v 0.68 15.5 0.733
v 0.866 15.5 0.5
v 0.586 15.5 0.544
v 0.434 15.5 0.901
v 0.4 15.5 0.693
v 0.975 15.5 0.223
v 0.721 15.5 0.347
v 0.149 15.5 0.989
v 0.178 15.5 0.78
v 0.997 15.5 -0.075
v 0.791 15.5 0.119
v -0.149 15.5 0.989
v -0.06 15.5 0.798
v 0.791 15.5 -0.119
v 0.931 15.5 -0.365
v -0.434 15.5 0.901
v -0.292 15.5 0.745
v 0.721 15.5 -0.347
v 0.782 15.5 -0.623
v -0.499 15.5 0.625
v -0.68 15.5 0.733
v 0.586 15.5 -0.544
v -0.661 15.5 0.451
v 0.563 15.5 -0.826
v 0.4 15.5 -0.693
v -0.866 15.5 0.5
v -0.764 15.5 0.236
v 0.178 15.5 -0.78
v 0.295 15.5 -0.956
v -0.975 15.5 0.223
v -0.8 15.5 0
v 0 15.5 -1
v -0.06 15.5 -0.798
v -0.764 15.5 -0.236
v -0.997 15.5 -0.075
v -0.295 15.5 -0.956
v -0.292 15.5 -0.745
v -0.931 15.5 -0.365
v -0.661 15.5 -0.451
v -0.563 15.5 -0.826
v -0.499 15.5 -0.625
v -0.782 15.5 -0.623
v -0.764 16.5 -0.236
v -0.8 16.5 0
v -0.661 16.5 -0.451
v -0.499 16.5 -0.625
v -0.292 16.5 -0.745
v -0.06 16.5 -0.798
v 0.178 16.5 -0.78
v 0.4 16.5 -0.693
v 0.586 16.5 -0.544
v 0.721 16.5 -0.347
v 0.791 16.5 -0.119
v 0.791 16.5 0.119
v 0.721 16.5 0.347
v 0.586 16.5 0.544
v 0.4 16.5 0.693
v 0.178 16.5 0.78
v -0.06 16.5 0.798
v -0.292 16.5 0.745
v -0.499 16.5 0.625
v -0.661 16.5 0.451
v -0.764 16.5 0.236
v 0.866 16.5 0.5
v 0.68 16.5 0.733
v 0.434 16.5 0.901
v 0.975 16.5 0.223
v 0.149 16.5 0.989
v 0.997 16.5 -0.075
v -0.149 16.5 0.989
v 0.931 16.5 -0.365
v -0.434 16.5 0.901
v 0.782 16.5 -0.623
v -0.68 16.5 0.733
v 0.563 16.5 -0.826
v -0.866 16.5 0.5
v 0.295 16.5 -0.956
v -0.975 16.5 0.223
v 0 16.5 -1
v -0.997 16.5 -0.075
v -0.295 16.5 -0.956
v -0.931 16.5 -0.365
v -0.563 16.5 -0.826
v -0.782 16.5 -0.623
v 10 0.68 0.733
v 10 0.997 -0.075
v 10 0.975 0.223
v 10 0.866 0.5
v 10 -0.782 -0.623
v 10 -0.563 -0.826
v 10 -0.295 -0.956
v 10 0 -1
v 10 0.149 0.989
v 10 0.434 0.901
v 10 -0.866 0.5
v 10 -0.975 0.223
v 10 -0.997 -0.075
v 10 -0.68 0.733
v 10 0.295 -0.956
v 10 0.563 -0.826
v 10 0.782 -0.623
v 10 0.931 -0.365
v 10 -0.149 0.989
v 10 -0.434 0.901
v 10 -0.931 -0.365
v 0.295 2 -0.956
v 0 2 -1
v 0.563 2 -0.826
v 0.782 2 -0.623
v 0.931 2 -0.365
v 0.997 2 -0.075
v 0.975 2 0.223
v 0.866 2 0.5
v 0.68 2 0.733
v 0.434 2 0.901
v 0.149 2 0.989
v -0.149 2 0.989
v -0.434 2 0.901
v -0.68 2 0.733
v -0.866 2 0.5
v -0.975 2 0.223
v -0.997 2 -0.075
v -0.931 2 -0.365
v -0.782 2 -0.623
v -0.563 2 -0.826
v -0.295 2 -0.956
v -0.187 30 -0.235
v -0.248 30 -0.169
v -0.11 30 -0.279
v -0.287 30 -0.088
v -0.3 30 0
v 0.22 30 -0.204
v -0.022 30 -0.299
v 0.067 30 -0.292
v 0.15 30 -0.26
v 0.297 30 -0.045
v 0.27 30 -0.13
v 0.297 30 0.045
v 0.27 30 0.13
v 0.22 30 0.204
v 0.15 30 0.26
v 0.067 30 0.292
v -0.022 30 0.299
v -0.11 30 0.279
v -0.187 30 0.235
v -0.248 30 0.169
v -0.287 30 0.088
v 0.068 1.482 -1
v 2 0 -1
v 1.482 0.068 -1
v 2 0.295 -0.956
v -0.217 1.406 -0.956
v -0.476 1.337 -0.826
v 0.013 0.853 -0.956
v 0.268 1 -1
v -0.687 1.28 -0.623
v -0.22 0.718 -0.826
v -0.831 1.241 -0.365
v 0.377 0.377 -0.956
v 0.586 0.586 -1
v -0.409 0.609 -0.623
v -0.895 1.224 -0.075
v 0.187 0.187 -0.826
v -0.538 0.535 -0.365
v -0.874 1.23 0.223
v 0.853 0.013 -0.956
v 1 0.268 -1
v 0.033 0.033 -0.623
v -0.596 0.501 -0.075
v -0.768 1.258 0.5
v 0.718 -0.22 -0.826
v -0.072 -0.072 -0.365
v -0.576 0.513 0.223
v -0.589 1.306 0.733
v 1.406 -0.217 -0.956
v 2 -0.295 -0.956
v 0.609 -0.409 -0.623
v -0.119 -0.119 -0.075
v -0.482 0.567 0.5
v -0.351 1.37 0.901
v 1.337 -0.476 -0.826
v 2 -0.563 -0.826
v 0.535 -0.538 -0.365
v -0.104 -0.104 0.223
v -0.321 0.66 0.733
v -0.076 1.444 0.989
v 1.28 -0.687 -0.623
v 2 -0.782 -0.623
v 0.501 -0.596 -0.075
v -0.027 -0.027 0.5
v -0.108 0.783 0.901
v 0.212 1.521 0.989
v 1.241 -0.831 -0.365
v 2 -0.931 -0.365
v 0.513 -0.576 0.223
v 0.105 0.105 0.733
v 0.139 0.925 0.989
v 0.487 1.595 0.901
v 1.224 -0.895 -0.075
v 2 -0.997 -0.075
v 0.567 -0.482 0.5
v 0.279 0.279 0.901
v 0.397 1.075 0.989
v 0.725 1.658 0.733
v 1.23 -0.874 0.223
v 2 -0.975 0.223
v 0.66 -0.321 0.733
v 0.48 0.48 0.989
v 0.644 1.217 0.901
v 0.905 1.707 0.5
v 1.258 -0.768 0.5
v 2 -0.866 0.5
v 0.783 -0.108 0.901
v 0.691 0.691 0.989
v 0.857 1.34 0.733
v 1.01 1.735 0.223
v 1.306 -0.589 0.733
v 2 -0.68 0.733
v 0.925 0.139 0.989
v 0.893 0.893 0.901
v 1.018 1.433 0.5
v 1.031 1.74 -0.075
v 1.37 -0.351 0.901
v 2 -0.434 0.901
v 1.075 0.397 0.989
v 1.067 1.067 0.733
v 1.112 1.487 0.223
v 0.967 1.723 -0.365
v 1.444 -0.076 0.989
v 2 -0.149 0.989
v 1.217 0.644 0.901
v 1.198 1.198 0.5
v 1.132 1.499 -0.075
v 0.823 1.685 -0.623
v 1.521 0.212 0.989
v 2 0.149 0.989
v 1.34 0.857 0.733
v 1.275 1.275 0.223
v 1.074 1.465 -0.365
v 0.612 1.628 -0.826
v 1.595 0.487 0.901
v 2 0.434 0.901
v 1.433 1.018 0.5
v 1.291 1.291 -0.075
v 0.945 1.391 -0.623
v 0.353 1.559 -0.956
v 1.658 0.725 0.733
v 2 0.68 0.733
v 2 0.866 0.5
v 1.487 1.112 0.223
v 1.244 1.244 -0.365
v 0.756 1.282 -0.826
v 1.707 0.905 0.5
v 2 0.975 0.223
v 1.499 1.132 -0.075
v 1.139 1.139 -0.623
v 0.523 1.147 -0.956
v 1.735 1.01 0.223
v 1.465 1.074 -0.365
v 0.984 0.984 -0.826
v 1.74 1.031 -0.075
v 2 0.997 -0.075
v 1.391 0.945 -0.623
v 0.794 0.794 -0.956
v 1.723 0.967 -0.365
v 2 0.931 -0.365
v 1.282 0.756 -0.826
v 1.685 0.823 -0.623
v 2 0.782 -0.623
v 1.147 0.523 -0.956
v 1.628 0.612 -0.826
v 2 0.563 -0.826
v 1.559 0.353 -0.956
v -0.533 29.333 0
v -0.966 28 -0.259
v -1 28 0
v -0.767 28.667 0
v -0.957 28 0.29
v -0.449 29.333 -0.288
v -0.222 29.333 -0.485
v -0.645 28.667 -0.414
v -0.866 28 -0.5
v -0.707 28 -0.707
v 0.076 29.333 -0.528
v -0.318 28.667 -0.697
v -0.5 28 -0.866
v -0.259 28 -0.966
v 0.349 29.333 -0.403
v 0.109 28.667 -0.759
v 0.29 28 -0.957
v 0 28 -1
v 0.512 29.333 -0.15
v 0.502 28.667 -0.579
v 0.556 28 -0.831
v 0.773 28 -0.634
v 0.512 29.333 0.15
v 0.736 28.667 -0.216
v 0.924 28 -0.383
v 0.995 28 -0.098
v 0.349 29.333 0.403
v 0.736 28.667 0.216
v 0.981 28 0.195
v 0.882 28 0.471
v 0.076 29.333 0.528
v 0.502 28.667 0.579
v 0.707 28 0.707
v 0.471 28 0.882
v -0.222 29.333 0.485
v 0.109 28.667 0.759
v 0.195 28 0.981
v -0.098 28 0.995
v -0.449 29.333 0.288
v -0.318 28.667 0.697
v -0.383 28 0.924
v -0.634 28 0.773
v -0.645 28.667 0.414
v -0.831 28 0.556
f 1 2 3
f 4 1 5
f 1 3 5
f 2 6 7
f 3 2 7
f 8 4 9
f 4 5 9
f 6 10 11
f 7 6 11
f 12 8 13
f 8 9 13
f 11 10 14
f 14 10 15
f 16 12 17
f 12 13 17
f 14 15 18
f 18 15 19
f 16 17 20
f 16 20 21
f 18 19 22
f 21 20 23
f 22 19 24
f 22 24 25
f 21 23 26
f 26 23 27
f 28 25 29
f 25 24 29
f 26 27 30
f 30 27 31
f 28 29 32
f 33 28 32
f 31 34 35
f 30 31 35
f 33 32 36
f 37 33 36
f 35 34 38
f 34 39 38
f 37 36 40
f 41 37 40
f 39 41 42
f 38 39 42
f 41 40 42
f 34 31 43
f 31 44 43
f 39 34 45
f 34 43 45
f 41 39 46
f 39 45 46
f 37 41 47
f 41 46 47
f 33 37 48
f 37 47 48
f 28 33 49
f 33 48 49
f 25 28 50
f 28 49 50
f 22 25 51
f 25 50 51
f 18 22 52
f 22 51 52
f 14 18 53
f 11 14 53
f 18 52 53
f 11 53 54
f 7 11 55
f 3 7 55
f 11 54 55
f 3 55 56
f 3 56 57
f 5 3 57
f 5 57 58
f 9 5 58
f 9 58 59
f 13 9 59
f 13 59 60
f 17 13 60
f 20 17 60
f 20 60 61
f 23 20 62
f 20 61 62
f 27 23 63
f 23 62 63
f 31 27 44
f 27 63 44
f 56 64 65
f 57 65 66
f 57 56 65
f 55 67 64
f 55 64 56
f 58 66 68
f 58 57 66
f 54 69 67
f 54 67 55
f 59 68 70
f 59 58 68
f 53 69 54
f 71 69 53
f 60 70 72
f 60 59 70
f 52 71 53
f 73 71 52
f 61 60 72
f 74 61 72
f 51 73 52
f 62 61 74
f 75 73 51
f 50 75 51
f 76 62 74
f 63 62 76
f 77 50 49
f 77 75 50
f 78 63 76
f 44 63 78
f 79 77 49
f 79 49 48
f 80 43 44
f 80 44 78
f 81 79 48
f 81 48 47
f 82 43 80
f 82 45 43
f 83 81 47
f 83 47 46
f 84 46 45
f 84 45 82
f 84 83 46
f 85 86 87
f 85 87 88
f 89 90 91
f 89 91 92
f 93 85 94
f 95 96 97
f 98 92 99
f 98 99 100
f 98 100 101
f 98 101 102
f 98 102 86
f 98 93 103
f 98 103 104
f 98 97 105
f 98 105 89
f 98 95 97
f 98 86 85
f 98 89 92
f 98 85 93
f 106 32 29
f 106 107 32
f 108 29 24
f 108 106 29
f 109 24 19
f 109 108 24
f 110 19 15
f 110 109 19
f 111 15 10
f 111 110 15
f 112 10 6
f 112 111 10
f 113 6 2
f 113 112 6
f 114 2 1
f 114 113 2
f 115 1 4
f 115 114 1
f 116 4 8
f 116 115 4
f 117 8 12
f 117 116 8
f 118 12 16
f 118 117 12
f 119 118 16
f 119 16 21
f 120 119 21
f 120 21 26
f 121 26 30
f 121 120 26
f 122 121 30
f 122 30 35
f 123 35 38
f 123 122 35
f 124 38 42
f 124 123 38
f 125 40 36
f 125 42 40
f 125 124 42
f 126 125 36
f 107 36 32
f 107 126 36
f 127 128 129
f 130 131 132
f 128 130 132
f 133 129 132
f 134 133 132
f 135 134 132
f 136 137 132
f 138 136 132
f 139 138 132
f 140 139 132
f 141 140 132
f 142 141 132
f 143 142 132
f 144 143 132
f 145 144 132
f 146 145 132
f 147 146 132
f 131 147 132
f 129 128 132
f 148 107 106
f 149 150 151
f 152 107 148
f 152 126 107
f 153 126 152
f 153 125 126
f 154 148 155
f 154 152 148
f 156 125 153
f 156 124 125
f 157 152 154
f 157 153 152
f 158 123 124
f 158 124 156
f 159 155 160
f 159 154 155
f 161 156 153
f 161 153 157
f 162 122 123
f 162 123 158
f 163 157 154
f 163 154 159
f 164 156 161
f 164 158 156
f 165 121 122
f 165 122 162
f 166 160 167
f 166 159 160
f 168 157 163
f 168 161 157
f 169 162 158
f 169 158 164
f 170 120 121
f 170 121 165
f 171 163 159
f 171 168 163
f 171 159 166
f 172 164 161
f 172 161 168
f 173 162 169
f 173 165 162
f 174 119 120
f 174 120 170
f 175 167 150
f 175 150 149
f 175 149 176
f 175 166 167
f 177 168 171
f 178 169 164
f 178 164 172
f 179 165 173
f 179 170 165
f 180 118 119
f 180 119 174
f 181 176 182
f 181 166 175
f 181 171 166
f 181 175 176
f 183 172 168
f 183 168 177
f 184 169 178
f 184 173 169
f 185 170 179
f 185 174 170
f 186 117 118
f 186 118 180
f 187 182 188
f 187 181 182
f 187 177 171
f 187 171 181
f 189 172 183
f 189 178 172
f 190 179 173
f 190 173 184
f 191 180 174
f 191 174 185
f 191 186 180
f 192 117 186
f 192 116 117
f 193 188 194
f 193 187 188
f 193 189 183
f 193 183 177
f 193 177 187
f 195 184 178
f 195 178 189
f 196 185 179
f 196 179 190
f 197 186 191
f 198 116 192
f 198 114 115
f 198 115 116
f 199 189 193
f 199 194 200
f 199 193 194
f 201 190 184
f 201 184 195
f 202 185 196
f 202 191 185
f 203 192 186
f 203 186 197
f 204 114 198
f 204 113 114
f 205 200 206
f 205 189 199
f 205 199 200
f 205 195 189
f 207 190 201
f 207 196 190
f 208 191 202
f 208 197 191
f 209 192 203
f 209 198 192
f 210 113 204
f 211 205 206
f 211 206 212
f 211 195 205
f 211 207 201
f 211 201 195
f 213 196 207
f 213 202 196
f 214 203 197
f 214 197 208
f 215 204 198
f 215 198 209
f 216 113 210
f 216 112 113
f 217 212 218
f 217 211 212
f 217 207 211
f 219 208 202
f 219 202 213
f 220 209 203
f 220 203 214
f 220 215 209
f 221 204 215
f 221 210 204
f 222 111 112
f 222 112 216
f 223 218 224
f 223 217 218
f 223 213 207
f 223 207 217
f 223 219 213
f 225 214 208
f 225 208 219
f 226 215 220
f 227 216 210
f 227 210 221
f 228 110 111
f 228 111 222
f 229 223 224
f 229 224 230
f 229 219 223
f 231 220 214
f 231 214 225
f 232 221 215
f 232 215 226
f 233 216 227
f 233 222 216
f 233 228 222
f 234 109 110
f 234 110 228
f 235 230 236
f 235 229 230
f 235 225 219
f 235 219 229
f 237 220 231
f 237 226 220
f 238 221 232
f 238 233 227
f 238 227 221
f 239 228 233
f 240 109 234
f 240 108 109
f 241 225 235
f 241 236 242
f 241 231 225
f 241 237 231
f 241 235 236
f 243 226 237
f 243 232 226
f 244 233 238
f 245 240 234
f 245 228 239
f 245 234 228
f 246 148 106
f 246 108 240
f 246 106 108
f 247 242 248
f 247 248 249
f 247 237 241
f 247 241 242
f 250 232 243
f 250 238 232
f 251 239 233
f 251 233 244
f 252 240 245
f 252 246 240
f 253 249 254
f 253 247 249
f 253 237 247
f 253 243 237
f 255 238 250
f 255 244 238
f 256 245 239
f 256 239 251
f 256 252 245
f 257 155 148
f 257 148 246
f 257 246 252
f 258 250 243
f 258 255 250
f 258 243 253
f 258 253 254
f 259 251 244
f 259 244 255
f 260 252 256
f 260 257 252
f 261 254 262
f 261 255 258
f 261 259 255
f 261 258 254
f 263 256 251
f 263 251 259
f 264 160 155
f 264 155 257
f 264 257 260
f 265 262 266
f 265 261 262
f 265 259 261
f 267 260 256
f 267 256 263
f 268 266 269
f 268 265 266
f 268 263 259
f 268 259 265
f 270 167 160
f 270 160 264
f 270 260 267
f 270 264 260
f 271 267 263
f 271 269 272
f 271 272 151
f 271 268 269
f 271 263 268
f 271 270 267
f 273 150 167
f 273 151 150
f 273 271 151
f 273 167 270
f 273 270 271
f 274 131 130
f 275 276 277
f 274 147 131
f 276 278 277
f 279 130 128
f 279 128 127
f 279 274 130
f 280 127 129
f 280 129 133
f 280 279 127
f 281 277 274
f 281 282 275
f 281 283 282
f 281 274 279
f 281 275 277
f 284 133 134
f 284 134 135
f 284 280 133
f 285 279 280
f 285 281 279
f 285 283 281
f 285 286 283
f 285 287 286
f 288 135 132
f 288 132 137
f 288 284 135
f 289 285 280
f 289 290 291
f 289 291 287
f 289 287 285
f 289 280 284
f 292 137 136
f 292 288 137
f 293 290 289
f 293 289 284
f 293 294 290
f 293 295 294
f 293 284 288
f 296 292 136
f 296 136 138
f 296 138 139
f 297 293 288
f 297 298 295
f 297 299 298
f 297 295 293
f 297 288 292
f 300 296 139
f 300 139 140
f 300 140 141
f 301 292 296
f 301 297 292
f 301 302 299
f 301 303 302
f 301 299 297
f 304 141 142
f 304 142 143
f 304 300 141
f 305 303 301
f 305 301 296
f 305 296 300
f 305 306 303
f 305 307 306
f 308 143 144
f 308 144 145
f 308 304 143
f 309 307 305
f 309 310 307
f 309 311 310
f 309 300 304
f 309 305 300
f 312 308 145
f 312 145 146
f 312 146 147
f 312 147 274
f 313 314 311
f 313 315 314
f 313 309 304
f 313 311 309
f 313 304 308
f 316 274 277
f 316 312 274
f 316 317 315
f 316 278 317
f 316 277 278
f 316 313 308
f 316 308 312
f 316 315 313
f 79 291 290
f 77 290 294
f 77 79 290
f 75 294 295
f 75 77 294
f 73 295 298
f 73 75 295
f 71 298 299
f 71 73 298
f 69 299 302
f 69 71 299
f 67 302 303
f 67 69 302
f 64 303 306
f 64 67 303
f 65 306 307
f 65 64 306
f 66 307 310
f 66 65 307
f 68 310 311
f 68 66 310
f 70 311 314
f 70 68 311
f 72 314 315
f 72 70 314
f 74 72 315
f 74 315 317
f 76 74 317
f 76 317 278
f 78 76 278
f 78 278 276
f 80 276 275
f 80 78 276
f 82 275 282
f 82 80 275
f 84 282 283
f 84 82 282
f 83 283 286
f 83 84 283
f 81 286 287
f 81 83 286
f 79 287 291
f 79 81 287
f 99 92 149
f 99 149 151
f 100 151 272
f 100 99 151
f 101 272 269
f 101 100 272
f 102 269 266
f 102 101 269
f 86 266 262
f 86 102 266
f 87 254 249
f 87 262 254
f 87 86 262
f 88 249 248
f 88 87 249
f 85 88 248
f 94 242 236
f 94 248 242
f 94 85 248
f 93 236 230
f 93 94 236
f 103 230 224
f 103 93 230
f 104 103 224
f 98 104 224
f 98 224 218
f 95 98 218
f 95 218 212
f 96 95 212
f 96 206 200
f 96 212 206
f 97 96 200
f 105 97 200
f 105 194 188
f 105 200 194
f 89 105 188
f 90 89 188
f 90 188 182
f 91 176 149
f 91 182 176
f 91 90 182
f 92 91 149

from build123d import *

# Parameters (mm, degrees)
SKETCH2_R = 1
SKETCH3_W = 0.2
SKETCH3_H = 1


with BuildPart() as part:
    # Sweep1: sweep along a path in Sketch1
    with BuildLine(Plane.XY) as sweep1_path:
        Line((0, 30), (0, 2))
        ThreePointArc((0, 2), (0.585786438, 0.585786438), (2, 0))
        Line((2, 0), (10, 0))
    # Sketch2 → Sweep1 (sweep)
    with BuildSketch(Plane(origin=(10, 0, 0), x_dir=(0, 0, -1), z_dir=(1, 0, 0))):
        Circle(SKETCH2_R)
    sweep(path=sweep1_path.line)

    # Sketch3 → Cut-Revolve1 (revolve, cut)
    with BuildSketch(Plane.XY):
        Polygon((-0.3, 30), (-1, 28), (-1, 30), align=None)
        with Locations((-0.9, 16)):
            Rectangle(SKETCH3_W, SKETCH3_H)
    revolve(axis=Axis((0, 30, 0), (0, -1, 0)), mode=Mode.SUBTRACT)


solid = part.part
